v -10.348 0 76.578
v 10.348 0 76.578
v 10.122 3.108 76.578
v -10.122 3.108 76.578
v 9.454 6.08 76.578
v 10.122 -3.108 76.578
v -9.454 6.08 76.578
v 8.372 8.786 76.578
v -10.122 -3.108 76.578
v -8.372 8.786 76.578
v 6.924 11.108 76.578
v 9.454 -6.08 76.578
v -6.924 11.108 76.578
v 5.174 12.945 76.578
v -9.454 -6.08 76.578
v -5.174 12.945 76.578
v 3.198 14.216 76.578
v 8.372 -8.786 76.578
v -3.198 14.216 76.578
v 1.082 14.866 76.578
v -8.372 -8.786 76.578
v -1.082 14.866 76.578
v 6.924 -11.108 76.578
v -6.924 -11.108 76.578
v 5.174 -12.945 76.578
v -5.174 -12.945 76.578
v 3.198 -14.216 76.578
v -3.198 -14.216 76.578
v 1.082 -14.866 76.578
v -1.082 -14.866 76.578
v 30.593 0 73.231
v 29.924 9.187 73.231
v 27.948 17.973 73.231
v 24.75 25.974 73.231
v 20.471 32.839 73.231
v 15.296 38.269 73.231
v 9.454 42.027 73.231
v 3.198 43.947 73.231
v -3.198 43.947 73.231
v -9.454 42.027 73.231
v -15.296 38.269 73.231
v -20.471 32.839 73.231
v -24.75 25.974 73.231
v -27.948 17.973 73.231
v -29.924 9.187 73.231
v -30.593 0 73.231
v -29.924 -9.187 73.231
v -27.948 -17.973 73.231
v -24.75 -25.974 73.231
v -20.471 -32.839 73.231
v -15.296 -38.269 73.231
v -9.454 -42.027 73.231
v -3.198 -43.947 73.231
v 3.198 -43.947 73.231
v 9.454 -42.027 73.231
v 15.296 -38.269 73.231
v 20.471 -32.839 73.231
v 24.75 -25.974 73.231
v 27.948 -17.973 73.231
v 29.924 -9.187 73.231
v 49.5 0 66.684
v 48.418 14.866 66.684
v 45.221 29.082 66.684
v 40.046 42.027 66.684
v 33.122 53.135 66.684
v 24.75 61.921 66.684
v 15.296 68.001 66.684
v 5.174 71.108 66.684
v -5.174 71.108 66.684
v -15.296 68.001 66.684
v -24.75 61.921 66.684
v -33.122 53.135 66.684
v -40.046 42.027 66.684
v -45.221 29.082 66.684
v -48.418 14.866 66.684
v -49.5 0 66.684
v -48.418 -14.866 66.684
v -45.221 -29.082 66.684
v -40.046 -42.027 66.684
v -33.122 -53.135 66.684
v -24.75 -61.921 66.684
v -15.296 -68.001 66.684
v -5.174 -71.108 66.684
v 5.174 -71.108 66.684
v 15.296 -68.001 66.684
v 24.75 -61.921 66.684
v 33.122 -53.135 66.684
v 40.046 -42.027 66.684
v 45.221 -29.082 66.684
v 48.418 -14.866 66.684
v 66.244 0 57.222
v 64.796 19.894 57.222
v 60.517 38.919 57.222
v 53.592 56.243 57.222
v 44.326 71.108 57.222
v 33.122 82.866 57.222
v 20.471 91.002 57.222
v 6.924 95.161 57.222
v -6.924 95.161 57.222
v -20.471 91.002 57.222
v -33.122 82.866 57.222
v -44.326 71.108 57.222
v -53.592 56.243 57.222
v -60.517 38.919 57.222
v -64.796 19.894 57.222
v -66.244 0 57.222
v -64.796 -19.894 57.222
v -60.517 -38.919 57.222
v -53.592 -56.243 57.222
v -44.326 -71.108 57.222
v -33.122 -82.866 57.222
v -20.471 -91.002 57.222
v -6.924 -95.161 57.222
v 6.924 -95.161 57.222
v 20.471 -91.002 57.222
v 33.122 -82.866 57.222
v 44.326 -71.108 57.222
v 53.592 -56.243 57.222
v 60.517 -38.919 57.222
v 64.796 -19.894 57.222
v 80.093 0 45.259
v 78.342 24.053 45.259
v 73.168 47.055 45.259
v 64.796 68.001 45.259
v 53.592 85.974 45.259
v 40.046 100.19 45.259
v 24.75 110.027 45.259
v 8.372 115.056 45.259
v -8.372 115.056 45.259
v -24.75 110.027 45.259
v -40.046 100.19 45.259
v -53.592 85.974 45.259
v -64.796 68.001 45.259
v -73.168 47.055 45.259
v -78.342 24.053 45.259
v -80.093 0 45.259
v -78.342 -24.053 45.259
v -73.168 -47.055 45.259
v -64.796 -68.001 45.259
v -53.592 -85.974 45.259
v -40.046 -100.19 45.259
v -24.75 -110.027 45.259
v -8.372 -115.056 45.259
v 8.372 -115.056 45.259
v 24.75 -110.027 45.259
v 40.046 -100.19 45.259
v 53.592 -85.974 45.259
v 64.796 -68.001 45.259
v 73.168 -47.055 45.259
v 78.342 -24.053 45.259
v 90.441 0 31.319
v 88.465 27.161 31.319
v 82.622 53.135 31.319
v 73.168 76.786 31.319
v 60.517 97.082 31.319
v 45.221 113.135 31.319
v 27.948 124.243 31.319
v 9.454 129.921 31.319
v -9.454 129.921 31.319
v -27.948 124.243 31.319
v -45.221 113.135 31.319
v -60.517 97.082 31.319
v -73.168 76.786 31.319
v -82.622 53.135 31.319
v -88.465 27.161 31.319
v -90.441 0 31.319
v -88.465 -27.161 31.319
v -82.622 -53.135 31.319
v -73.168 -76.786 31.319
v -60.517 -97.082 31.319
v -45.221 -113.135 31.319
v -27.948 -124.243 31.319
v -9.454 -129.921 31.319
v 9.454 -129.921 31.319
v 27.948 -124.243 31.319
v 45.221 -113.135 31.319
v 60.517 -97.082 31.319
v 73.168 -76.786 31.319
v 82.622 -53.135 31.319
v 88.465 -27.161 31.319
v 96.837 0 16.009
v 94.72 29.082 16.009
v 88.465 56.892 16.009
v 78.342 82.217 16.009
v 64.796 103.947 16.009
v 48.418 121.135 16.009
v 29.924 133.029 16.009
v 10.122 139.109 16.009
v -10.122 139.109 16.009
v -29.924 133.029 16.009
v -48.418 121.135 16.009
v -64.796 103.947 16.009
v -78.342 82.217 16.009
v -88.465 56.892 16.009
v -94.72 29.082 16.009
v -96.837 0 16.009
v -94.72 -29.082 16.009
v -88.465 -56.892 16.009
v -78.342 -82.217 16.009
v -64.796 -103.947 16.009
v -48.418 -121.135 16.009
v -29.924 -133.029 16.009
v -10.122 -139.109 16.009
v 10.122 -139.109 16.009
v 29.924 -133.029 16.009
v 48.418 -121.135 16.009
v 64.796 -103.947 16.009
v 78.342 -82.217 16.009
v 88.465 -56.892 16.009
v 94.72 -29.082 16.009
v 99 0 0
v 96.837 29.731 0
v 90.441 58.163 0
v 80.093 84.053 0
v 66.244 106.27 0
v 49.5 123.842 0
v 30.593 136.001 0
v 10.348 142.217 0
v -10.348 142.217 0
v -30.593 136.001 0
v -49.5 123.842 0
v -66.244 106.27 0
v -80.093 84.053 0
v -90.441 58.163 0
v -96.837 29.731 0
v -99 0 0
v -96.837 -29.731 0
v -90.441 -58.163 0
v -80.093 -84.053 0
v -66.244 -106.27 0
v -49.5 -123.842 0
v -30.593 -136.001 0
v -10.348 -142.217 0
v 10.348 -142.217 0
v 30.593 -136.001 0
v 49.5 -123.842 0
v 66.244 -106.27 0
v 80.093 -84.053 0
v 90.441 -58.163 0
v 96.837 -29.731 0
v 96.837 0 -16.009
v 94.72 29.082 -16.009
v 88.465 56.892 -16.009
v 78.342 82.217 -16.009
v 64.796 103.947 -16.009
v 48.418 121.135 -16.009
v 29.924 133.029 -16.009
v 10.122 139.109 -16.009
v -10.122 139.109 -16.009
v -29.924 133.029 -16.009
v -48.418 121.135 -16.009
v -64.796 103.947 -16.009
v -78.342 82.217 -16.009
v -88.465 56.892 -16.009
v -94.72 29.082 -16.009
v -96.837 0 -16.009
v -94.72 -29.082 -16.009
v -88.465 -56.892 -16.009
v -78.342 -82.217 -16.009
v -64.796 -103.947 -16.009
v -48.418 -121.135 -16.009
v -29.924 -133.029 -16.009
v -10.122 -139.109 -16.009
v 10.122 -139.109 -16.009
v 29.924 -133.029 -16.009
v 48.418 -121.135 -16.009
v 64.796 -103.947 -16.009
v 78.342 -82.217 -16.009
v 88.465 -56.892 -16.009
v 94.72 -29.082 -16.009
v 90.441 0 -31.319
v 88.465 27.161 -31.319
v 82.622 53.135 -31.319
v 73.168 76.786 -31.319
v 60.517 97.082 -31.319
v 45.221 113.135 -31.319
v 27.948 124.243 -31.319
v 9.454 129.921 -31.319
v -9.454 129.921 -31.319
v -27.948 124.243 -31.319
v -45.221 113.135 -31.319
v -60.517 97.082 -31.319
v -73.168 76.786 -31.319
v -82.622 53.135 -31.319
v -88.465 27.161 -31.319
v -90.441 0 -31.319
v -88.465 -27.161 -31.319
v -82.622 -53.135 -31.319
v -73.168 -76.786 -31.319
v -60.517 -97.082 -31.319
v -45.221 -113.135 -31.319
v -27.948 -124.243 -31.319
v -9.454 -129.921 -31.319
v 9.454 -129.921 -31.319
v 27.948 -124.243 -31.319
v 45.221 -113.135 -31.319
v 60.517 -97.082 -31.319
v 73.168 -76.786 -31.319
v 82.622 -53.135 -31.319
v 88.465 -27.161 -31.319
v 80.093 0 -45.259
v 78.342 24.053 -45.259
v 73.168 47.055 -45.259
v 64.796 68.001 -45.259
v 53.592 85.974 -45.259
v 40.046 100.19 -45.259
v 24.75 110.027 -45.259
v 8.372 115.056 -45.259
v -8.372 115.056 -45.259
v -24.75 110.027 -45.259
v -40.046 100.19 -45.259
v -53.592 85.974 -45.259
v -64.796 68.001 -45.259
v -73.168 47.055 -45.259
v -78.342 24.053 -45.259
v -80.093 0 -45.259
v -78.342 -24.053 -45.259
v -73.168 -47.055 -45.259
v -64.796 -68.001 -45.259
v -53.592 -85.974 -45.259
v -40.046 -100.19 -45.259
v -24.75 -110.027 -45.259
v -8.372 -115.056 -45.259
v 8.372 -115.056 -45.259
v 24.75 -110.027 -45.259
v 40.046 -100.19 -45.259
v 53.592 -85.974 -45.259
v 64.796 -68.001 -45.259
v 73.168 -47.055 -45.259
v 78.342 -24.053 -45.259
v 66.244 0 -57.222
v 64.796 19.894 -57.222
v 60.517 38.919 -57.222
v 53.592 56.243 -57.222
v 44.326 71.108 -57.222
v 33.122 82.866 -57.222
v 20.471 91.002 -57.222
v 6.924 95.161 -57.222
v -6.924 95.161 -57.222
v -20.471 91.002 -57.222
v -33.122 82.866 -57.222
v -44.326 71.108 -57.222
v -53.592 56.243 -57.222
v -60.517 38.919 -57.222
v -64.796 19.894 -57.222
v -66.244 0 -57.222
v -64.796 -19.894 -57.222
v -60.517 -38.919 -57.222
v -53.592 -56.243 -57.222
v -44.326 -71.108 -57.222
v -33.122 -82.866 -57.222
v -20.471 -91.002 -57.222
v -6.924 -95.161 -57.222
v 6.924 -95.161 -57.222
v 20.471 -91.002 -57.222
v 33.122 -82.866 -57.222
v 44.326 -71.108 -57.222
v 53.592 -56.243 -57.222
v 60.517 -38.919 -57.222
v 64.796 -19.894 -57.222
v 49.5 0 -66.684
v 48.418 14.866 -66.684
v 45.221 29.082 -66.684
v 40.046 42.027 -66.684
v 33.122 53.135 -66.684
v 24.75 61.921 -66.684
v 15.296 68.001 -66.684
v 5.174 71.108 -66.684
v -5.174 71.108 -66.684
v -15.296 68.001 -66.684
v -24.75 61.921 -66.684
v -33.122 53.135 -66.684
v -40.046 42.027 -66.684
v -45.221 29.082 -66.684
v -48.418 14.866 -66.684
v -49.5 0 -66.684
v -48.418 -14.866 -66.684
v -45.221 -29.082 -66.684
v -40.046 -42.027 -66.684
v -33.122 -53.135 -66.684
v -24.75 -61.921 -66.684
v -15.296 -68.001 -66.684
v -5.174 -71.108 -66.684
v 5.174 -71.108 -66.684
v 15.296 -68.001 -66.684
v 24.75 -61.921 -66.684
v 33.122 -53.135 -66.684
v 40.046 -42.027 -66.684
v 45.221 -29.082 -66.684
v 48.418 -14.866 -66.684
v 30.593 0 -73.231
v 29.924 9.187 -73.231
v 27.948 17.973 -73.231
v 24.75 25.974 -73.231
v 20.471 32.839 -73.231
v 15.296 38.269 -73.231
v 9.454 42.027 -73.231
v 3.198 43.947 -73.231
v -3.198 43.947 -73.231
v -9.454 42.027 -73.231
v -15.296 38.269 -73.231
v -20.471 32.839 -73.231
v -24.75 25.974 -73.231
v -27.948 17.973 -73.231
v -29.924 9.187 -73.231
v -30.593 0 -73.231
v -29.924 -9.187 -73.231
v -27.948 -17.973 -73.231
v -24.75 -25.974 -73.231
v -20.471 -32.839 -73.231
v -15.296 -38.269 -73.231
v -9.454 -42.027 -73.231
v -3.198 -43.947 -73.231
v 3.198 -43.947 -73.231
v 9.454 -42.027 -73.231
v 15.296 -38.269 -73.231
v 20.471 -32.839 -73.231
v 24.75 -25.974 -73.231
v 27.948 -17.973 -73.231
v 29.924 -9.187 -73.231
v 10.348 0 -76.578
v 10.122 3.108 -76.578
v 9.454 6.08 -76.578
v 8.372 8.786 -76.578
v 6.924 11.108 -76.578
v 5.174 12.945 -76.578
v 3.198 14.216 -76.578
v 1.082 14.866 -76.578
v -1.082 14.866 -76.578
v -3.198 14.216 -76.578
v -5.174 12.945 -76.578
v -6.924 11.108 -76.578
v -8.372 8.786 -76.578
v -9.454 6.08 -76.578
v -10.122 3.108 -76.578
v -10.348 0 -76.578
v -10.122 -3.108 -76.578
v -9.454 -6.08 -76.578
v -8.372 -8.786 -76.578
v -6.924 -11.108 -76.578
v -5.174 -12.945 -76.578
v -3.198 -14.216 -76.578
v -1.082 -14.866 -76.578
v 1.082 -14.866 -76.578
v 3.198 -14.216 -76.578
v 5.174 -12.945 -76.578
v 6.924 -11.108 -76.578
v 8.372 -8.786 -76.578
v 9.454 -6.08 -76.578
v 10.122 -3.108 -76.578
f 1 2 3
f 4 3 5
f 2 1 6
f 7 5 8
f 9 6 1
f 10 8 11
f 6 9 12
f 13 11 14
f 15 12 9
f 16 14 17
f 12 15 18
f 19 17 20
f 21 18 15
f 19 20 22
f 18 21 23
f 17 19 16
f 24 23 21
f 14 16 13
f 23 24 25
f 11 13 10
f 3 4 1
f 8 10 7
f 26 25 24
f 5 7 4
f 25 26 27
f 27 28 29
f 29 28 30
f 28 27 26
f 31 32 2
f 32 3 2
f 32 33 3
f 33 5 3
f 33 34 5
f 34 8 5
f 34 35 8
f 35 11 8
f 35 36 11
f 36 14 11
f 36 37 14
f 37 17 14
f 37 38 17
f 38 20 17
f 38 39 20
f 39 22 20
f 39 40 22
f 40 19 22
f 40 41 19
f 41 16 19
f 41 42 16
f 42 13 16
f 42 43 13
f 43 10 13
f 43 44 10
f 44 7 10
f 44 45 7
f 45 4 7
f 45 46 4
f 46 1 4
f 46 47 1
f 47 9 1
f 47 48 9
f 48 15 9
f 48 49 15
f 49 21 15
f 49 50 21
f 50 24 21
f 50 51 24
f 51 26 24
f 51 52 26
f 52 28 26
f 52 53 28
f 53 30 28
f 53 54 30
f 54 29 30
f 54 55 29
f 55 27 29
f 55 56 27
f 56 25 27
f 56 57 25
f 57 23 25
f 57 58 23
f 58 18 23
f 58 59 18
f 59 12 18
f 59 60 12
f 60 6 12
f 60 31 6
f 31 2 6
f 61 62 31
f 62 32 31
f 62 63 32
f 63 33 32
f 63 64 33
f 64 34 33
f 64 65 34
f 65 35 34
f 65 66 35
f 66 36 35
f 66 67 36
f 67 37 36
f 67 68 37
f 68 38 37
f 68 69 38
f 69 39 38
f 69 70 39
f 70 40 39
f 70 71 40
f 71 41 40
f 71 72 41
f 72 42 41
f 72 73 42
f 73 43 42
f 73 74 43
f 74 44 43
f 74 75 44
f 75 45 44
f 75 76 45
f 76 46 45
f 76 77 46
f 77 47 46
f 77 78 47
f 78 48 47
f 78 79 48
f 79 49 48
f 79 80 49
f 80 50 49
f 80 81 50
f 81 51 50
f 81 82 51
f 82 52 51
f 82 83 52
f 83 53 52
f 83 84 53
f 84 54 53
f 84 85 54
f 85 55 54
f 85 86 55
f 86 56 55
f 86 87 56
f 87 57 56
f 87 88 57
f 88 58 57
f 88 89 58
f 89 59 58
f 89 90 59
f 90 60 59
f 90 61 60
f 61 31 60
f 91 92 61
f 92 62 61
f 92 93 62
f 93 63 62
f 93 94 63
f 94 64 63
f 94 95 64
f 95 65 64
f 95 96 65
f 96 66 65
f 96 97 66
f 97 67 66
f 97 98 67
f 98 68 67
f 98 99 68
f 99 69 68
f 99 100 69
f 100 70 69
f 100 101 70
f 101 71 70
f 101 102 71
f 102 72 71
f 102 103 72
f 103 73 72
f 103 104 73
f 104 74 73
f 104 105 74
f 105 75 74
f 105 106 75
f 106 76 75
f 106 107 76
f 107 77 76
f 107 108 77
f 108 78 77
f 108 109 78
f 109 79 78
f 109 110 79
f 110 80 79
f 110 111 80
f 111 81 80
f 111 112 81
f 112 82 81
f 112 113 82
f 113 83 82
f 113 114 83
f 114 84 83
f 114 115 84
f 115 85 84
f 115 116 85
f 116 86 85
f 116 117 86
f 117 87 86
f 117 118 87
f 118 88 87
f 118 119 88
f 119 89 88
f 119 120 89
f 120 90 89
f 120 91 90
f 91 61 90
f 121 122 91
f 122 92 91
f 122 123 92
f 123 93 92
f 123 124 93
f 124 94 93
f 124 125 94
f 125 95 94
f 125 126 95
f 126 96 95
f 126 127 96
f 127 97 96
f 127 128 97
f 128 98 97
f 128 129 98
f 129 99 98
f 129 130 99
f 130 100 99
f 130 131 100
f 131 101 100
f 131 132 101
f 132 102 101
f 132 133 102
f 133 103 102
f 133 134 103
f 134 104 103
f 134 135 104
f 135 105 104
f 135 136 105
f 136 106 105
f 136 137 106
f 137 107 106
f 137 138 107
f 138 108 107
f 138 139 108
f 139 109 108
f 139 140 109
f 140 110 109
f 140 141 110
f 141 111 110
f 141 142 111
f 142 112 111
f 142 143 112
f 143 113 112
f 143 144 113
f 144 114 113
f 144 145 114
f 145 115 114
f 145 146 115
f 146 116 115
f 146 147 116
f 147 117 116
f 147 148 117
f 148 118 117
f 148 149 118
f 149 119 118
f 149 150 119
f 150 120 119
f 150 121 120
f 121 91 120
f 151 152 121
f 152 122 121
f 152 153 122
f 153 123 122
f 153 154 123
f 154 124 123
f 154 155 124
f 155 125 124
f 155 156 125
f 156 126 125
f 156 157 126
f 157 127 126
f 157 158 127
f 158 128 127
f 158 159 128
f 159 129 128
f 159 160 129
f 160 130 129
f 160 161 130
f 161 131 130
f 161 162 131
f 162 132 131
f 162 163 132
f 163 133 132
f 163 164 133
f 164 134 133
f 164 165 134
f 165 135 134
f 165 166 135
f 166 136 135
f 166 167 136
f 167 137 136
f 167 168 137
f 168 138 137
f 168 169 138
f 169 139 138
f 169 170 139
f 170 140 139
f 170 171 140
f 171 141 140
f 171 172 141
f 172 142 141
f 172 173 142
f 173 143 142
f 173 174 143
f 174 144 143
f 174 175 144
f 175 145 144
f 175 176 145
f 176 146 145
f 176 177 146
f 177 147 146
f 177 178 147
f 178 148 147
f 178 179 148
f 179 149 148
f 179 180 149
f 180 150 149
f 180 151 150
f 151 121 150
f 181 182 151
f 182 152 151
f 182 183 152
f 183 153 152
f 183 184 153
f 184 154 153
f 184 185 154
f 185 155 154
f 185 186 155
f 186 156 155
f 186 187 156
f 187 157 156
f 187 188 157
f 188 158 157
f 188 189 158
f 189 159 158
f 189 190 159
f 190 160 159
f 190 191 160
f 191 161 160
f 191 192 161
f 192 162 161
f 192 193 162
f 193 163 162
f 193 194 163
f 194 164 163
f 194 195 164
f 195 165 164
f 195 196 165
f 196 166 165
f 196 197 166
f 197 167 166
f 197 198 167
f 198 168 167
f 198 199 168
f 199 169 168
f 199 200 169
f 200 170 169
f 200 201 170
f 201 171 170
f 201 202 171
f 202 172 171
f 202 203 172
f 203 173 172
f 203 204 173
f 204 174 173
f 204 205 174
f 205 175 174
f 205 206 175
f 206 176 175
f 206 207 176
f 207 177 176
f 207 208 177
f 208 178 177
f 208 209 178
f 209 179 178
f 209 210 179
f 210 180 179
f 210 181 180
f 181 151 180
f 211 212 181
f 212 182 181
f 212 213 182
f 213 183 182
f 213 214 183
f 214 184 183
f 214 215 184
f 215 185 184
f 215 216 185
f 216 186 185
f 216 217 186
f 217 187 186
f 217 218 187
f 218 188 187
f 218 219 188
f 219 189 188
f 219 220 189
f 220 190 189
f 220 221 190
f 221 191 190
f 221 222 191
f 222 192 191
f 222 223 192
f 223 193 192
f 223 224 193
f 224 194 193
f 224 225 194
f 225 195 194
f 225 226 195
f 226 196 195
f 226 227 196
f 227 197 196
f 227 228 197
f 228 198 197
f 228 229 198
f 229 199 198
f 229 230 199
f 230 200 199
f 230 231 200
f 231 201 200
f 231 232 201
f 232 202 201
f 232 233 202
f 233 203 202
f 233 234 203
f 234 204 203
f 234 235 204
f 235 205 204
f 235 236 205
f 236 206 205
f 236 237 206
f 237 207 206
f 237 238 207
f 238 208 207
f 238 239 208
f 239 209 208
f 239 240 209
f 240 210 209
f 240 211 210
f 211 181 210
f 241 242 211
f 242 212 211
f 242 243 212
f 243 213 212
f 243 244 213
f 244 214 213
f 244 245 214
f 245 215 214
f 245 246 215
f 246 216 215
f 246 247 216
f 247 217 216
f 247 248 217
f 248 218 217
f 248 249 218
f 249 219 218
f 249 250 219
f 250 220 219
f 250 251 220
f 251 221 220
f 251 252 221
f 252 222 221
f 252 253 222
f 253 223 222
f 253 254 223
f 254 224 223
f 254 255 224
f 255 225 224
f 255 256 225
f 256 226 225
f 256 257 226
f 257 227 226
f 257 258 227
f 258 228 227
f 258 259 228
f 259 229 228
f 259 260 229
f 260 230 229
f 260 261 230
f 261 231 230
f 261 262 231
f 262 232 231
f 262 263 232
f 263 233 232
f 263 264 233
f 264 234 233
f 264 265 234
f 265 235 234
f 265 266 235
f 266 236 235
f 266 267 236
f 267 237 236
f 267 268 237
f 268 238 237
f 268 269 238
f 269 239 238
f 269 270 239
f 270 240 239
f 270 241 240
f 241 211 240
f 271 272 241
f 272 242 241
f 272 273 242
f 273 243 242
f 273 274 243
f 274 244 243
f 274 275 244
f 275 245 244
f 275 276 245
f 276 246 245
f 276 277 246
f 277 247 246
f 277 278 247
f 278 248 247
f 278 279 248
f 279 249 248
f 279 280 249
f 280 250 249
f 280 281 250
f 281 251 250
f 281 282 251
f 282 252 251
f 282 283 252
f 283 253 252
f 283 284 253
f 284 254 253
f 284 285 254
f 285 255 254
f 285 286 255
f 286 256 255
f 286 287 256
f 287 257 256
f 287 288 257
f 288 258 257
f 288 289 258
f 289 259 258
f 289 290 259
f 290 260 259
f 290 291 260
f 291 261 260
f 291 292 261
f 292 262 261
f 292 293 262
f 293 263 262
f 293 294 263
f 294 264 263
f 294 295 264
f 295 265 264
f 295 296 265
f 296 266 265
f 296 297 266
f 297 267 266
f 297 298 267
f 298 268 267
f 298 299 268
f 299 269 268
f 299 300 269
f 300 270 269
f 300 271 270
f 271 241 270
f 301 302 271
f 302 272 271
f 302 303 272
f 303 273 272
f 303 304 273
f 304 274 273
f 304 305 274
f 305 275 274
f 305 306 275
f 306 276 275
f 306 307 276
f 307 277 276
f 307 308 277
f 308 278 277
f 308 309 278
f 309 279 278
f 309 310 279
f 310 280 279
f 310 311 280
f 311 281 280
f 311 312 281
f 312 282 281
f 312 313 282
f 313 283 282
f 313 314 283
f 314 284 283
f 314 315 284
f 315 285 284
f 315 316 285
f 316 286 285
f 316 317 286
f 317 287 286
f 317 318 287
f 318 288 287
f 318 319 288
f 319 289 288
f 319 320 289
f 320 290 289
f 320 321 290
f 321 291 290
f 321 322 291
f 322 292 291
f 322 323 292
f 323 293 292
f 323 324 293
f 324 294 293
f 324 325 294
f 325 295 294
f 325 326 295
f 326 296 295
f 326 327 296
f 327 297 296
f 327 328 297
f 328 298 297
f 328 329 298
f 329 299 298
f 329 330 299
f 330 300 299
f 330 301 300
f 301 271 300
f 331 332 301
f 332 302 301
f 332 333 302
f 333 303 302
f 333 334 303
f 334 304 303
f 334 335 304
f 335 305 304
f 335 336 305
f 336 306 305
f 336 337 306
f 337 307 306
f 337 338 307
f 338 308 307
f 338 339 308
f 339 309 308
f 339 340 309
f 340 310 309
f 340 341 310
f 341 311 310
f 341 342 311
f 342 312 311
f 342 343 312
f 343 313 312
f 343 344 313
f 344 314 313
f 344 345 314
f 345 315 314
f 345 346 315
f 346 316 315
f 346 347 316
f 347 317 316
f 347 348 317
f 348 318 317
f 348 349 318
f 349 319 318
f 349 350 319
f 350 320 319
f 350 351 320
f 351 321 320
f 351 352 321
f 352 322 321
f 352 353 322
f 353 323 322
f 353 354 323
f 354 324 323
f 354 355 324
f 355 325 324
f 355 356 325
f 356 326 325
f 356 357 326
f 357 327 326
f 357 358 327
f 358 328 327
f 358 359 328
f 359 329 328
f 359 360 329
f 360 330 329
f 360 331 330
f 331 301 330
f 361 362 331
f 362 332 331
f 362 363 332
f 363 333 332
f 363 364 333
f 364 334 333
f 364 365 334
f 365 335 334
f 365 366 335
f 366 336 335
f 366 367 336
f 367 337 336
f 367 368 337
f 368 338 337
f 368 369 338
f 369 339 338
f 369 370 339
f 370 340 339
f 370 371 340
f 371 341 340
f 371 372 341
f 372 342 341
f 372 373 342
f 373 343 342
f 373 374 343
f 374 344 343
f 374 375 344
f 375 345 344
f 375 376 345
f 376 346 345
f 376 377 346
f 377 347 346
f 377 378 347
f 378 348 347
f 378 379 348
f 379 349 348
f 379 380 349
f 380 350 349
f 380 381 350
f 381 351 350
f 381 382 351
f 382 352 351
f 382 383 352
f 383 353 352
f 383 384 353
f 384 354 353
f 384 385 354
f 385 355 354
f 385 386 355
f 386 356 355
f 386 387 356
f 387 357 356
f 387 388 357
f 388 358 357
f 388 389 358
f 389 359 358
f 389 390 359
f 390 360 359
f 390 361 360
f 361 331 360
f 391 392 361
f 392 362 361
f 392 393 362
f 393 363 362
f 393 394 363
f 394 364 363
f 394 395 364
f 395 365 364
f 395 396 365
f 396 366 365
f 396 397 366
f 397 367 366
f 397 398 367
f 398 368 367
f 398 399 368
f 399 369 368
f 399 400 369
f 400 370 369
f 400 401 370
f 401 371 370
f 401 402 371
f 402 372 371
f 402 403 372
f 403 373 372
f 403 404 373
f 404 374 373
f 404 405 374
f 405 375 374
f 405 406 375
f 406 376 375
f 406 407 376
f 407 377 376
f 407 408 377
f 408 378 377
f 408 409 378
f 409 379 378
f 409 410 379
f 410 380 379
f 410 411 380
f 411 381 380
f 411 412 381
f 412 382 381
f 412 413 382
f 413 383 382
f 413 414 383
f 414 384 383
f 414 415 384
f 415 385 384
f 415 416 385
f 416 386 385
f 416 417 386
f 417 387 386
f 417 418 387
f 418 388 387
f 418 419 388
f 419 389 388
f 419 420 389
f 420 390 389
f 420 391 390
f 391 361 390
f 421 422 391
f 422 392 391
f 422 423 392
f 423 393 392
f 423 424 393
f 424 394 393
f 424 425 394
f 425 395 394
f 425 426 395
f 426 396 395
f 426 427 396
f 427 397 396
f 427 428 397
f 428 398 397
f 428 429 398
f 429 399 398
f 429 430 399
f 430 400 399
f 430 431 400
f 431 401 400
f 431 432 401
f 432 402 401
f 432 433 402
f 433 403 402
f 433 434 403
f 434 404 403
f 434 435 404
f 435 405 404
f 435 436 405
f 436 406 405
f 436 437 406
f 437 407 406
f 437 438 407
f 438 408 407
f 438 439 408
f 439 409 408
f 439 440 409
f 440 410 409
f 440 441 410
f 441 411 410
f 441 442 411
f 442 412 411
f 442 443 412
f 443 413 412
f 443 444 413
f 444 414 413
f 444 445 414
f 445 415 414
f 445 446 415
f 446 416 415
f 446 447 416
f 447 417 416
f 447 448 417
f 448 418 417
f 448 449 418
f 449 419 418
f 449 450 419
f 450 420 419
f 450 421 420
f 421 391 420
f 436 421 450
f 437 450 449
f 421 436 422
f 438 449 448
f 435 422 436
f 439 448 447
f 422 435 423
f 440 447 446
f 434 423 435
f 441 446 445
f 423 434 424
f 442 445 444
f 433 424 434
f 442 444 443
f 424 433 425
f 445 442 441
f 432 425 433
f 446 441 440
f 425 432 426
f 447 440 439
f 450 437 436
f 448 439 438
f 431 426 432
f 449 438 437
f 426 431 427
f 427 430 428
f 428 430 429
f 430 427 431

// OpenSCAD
// Generated by SolidPython 1.0.1 on 2020-07-29 00:46:48


scale(v = [9, 13, 7]) {
	sphere(r = 11);
}
/***********************************************
*********      SolidPython code:      **********
************************************************
 
# import packages: SolidPython
from solid import *
from solid.utils import *
from itertools import chain, combinations, permutations


class Resize:

    def __init__(self, scad_file):
        self.scad_file = scad_file
        #self.scad_file = import_scad(scad_file)
        # cone/cylinder param:
        self.r1 = 0
        self.r2 = 0
        self.h = 0
        # rectangular prism param:
        self.w = 0
        self.l = 0
        # ellipse param:
        self.r = 0

    # import OpenScad code (file name corresponds to shape)


    # classify shape + parameters
    def assign(self, param1, param2, param3):
        if self.scad_file == 'cone.scad':
            self.r1 = param1
            self.r2 = param2
            self.h = param3
        elif self.scad_file == 'cylinder.scad':
            self.r1 = param1
            self.r2 = param2
            self.h = param3
        elif self.scad_file == 'rectangularPrism.scad':
            self.h = param1
            self.l = param2
            self.w = param3
        else:
            self.r = param1
            self.h = param2

    # resize parameters
    def iterate(self):
        x = range(3, 20, 2)
        i = 1
        if self.scad_file == 'cone.scad':
            tempList = list(permutations(x, 2))
            for temp in tempList:
                param1 = temp[0]
                param2 = temp[1]
                filepath = 'produced_scad_files/' + 'cone' + str(param1) + '_' + str(param2) + '_' + '.scad'
                scad_render_to_file(cylinder(h=param1, r1=param2, r2=0), filepath)

        elif self.scad_file == 'cylinder.scad':
            tempList = list(permutations(x, 3))
            for temp in tempList:
                param1 = temp[0]
                param2 = temp[1]
                filepath = 'produced_scad_files/' + 'cylinder' + str(param1) + '_' + str(param2) + '_' + '.scad'
                scad_render_to_file(cylinder(h=param1, r1=param2, r2=param2), filepath)

        elif self.scad_file == 'rectangularPrism.scad':
            tempList = list(permutations(x, 3))
            for temp in tempList:
                param1 = temp[0]
                param2 = temp[1]
                param3 = temp[2]
                filepath = 'produced_scad_files/' + 'rectangularPrism' + str(param1) + '_' + str(param2) + '_' + str(
                    param3) + '.scad'
                scad_render_to_file(cube(size=(param1, param2, param3)), filepath)

        elif self.scad_file == 'ellipse.scad':
            tempList = list(permutations(x, 4))
            for temp in tempList:
                param1 = temp[0]
                param2 = temp[1]
                param3 = temp[2]
                param4 = temp[3]
                filepath = 'produced_scad_files/' + 'ellipse' + str(param1) + '_' + str(param2) + '_' + str(param3) + '_' + str(param4) + '.scad'
                scad_render_to_file(scale([param1, param2, param3])(sphere(r=param4)), filepath)

    def render_to_scadfile(self):
        scad_render_to_file(scad, 'example.scad') 
 
************************************************/
